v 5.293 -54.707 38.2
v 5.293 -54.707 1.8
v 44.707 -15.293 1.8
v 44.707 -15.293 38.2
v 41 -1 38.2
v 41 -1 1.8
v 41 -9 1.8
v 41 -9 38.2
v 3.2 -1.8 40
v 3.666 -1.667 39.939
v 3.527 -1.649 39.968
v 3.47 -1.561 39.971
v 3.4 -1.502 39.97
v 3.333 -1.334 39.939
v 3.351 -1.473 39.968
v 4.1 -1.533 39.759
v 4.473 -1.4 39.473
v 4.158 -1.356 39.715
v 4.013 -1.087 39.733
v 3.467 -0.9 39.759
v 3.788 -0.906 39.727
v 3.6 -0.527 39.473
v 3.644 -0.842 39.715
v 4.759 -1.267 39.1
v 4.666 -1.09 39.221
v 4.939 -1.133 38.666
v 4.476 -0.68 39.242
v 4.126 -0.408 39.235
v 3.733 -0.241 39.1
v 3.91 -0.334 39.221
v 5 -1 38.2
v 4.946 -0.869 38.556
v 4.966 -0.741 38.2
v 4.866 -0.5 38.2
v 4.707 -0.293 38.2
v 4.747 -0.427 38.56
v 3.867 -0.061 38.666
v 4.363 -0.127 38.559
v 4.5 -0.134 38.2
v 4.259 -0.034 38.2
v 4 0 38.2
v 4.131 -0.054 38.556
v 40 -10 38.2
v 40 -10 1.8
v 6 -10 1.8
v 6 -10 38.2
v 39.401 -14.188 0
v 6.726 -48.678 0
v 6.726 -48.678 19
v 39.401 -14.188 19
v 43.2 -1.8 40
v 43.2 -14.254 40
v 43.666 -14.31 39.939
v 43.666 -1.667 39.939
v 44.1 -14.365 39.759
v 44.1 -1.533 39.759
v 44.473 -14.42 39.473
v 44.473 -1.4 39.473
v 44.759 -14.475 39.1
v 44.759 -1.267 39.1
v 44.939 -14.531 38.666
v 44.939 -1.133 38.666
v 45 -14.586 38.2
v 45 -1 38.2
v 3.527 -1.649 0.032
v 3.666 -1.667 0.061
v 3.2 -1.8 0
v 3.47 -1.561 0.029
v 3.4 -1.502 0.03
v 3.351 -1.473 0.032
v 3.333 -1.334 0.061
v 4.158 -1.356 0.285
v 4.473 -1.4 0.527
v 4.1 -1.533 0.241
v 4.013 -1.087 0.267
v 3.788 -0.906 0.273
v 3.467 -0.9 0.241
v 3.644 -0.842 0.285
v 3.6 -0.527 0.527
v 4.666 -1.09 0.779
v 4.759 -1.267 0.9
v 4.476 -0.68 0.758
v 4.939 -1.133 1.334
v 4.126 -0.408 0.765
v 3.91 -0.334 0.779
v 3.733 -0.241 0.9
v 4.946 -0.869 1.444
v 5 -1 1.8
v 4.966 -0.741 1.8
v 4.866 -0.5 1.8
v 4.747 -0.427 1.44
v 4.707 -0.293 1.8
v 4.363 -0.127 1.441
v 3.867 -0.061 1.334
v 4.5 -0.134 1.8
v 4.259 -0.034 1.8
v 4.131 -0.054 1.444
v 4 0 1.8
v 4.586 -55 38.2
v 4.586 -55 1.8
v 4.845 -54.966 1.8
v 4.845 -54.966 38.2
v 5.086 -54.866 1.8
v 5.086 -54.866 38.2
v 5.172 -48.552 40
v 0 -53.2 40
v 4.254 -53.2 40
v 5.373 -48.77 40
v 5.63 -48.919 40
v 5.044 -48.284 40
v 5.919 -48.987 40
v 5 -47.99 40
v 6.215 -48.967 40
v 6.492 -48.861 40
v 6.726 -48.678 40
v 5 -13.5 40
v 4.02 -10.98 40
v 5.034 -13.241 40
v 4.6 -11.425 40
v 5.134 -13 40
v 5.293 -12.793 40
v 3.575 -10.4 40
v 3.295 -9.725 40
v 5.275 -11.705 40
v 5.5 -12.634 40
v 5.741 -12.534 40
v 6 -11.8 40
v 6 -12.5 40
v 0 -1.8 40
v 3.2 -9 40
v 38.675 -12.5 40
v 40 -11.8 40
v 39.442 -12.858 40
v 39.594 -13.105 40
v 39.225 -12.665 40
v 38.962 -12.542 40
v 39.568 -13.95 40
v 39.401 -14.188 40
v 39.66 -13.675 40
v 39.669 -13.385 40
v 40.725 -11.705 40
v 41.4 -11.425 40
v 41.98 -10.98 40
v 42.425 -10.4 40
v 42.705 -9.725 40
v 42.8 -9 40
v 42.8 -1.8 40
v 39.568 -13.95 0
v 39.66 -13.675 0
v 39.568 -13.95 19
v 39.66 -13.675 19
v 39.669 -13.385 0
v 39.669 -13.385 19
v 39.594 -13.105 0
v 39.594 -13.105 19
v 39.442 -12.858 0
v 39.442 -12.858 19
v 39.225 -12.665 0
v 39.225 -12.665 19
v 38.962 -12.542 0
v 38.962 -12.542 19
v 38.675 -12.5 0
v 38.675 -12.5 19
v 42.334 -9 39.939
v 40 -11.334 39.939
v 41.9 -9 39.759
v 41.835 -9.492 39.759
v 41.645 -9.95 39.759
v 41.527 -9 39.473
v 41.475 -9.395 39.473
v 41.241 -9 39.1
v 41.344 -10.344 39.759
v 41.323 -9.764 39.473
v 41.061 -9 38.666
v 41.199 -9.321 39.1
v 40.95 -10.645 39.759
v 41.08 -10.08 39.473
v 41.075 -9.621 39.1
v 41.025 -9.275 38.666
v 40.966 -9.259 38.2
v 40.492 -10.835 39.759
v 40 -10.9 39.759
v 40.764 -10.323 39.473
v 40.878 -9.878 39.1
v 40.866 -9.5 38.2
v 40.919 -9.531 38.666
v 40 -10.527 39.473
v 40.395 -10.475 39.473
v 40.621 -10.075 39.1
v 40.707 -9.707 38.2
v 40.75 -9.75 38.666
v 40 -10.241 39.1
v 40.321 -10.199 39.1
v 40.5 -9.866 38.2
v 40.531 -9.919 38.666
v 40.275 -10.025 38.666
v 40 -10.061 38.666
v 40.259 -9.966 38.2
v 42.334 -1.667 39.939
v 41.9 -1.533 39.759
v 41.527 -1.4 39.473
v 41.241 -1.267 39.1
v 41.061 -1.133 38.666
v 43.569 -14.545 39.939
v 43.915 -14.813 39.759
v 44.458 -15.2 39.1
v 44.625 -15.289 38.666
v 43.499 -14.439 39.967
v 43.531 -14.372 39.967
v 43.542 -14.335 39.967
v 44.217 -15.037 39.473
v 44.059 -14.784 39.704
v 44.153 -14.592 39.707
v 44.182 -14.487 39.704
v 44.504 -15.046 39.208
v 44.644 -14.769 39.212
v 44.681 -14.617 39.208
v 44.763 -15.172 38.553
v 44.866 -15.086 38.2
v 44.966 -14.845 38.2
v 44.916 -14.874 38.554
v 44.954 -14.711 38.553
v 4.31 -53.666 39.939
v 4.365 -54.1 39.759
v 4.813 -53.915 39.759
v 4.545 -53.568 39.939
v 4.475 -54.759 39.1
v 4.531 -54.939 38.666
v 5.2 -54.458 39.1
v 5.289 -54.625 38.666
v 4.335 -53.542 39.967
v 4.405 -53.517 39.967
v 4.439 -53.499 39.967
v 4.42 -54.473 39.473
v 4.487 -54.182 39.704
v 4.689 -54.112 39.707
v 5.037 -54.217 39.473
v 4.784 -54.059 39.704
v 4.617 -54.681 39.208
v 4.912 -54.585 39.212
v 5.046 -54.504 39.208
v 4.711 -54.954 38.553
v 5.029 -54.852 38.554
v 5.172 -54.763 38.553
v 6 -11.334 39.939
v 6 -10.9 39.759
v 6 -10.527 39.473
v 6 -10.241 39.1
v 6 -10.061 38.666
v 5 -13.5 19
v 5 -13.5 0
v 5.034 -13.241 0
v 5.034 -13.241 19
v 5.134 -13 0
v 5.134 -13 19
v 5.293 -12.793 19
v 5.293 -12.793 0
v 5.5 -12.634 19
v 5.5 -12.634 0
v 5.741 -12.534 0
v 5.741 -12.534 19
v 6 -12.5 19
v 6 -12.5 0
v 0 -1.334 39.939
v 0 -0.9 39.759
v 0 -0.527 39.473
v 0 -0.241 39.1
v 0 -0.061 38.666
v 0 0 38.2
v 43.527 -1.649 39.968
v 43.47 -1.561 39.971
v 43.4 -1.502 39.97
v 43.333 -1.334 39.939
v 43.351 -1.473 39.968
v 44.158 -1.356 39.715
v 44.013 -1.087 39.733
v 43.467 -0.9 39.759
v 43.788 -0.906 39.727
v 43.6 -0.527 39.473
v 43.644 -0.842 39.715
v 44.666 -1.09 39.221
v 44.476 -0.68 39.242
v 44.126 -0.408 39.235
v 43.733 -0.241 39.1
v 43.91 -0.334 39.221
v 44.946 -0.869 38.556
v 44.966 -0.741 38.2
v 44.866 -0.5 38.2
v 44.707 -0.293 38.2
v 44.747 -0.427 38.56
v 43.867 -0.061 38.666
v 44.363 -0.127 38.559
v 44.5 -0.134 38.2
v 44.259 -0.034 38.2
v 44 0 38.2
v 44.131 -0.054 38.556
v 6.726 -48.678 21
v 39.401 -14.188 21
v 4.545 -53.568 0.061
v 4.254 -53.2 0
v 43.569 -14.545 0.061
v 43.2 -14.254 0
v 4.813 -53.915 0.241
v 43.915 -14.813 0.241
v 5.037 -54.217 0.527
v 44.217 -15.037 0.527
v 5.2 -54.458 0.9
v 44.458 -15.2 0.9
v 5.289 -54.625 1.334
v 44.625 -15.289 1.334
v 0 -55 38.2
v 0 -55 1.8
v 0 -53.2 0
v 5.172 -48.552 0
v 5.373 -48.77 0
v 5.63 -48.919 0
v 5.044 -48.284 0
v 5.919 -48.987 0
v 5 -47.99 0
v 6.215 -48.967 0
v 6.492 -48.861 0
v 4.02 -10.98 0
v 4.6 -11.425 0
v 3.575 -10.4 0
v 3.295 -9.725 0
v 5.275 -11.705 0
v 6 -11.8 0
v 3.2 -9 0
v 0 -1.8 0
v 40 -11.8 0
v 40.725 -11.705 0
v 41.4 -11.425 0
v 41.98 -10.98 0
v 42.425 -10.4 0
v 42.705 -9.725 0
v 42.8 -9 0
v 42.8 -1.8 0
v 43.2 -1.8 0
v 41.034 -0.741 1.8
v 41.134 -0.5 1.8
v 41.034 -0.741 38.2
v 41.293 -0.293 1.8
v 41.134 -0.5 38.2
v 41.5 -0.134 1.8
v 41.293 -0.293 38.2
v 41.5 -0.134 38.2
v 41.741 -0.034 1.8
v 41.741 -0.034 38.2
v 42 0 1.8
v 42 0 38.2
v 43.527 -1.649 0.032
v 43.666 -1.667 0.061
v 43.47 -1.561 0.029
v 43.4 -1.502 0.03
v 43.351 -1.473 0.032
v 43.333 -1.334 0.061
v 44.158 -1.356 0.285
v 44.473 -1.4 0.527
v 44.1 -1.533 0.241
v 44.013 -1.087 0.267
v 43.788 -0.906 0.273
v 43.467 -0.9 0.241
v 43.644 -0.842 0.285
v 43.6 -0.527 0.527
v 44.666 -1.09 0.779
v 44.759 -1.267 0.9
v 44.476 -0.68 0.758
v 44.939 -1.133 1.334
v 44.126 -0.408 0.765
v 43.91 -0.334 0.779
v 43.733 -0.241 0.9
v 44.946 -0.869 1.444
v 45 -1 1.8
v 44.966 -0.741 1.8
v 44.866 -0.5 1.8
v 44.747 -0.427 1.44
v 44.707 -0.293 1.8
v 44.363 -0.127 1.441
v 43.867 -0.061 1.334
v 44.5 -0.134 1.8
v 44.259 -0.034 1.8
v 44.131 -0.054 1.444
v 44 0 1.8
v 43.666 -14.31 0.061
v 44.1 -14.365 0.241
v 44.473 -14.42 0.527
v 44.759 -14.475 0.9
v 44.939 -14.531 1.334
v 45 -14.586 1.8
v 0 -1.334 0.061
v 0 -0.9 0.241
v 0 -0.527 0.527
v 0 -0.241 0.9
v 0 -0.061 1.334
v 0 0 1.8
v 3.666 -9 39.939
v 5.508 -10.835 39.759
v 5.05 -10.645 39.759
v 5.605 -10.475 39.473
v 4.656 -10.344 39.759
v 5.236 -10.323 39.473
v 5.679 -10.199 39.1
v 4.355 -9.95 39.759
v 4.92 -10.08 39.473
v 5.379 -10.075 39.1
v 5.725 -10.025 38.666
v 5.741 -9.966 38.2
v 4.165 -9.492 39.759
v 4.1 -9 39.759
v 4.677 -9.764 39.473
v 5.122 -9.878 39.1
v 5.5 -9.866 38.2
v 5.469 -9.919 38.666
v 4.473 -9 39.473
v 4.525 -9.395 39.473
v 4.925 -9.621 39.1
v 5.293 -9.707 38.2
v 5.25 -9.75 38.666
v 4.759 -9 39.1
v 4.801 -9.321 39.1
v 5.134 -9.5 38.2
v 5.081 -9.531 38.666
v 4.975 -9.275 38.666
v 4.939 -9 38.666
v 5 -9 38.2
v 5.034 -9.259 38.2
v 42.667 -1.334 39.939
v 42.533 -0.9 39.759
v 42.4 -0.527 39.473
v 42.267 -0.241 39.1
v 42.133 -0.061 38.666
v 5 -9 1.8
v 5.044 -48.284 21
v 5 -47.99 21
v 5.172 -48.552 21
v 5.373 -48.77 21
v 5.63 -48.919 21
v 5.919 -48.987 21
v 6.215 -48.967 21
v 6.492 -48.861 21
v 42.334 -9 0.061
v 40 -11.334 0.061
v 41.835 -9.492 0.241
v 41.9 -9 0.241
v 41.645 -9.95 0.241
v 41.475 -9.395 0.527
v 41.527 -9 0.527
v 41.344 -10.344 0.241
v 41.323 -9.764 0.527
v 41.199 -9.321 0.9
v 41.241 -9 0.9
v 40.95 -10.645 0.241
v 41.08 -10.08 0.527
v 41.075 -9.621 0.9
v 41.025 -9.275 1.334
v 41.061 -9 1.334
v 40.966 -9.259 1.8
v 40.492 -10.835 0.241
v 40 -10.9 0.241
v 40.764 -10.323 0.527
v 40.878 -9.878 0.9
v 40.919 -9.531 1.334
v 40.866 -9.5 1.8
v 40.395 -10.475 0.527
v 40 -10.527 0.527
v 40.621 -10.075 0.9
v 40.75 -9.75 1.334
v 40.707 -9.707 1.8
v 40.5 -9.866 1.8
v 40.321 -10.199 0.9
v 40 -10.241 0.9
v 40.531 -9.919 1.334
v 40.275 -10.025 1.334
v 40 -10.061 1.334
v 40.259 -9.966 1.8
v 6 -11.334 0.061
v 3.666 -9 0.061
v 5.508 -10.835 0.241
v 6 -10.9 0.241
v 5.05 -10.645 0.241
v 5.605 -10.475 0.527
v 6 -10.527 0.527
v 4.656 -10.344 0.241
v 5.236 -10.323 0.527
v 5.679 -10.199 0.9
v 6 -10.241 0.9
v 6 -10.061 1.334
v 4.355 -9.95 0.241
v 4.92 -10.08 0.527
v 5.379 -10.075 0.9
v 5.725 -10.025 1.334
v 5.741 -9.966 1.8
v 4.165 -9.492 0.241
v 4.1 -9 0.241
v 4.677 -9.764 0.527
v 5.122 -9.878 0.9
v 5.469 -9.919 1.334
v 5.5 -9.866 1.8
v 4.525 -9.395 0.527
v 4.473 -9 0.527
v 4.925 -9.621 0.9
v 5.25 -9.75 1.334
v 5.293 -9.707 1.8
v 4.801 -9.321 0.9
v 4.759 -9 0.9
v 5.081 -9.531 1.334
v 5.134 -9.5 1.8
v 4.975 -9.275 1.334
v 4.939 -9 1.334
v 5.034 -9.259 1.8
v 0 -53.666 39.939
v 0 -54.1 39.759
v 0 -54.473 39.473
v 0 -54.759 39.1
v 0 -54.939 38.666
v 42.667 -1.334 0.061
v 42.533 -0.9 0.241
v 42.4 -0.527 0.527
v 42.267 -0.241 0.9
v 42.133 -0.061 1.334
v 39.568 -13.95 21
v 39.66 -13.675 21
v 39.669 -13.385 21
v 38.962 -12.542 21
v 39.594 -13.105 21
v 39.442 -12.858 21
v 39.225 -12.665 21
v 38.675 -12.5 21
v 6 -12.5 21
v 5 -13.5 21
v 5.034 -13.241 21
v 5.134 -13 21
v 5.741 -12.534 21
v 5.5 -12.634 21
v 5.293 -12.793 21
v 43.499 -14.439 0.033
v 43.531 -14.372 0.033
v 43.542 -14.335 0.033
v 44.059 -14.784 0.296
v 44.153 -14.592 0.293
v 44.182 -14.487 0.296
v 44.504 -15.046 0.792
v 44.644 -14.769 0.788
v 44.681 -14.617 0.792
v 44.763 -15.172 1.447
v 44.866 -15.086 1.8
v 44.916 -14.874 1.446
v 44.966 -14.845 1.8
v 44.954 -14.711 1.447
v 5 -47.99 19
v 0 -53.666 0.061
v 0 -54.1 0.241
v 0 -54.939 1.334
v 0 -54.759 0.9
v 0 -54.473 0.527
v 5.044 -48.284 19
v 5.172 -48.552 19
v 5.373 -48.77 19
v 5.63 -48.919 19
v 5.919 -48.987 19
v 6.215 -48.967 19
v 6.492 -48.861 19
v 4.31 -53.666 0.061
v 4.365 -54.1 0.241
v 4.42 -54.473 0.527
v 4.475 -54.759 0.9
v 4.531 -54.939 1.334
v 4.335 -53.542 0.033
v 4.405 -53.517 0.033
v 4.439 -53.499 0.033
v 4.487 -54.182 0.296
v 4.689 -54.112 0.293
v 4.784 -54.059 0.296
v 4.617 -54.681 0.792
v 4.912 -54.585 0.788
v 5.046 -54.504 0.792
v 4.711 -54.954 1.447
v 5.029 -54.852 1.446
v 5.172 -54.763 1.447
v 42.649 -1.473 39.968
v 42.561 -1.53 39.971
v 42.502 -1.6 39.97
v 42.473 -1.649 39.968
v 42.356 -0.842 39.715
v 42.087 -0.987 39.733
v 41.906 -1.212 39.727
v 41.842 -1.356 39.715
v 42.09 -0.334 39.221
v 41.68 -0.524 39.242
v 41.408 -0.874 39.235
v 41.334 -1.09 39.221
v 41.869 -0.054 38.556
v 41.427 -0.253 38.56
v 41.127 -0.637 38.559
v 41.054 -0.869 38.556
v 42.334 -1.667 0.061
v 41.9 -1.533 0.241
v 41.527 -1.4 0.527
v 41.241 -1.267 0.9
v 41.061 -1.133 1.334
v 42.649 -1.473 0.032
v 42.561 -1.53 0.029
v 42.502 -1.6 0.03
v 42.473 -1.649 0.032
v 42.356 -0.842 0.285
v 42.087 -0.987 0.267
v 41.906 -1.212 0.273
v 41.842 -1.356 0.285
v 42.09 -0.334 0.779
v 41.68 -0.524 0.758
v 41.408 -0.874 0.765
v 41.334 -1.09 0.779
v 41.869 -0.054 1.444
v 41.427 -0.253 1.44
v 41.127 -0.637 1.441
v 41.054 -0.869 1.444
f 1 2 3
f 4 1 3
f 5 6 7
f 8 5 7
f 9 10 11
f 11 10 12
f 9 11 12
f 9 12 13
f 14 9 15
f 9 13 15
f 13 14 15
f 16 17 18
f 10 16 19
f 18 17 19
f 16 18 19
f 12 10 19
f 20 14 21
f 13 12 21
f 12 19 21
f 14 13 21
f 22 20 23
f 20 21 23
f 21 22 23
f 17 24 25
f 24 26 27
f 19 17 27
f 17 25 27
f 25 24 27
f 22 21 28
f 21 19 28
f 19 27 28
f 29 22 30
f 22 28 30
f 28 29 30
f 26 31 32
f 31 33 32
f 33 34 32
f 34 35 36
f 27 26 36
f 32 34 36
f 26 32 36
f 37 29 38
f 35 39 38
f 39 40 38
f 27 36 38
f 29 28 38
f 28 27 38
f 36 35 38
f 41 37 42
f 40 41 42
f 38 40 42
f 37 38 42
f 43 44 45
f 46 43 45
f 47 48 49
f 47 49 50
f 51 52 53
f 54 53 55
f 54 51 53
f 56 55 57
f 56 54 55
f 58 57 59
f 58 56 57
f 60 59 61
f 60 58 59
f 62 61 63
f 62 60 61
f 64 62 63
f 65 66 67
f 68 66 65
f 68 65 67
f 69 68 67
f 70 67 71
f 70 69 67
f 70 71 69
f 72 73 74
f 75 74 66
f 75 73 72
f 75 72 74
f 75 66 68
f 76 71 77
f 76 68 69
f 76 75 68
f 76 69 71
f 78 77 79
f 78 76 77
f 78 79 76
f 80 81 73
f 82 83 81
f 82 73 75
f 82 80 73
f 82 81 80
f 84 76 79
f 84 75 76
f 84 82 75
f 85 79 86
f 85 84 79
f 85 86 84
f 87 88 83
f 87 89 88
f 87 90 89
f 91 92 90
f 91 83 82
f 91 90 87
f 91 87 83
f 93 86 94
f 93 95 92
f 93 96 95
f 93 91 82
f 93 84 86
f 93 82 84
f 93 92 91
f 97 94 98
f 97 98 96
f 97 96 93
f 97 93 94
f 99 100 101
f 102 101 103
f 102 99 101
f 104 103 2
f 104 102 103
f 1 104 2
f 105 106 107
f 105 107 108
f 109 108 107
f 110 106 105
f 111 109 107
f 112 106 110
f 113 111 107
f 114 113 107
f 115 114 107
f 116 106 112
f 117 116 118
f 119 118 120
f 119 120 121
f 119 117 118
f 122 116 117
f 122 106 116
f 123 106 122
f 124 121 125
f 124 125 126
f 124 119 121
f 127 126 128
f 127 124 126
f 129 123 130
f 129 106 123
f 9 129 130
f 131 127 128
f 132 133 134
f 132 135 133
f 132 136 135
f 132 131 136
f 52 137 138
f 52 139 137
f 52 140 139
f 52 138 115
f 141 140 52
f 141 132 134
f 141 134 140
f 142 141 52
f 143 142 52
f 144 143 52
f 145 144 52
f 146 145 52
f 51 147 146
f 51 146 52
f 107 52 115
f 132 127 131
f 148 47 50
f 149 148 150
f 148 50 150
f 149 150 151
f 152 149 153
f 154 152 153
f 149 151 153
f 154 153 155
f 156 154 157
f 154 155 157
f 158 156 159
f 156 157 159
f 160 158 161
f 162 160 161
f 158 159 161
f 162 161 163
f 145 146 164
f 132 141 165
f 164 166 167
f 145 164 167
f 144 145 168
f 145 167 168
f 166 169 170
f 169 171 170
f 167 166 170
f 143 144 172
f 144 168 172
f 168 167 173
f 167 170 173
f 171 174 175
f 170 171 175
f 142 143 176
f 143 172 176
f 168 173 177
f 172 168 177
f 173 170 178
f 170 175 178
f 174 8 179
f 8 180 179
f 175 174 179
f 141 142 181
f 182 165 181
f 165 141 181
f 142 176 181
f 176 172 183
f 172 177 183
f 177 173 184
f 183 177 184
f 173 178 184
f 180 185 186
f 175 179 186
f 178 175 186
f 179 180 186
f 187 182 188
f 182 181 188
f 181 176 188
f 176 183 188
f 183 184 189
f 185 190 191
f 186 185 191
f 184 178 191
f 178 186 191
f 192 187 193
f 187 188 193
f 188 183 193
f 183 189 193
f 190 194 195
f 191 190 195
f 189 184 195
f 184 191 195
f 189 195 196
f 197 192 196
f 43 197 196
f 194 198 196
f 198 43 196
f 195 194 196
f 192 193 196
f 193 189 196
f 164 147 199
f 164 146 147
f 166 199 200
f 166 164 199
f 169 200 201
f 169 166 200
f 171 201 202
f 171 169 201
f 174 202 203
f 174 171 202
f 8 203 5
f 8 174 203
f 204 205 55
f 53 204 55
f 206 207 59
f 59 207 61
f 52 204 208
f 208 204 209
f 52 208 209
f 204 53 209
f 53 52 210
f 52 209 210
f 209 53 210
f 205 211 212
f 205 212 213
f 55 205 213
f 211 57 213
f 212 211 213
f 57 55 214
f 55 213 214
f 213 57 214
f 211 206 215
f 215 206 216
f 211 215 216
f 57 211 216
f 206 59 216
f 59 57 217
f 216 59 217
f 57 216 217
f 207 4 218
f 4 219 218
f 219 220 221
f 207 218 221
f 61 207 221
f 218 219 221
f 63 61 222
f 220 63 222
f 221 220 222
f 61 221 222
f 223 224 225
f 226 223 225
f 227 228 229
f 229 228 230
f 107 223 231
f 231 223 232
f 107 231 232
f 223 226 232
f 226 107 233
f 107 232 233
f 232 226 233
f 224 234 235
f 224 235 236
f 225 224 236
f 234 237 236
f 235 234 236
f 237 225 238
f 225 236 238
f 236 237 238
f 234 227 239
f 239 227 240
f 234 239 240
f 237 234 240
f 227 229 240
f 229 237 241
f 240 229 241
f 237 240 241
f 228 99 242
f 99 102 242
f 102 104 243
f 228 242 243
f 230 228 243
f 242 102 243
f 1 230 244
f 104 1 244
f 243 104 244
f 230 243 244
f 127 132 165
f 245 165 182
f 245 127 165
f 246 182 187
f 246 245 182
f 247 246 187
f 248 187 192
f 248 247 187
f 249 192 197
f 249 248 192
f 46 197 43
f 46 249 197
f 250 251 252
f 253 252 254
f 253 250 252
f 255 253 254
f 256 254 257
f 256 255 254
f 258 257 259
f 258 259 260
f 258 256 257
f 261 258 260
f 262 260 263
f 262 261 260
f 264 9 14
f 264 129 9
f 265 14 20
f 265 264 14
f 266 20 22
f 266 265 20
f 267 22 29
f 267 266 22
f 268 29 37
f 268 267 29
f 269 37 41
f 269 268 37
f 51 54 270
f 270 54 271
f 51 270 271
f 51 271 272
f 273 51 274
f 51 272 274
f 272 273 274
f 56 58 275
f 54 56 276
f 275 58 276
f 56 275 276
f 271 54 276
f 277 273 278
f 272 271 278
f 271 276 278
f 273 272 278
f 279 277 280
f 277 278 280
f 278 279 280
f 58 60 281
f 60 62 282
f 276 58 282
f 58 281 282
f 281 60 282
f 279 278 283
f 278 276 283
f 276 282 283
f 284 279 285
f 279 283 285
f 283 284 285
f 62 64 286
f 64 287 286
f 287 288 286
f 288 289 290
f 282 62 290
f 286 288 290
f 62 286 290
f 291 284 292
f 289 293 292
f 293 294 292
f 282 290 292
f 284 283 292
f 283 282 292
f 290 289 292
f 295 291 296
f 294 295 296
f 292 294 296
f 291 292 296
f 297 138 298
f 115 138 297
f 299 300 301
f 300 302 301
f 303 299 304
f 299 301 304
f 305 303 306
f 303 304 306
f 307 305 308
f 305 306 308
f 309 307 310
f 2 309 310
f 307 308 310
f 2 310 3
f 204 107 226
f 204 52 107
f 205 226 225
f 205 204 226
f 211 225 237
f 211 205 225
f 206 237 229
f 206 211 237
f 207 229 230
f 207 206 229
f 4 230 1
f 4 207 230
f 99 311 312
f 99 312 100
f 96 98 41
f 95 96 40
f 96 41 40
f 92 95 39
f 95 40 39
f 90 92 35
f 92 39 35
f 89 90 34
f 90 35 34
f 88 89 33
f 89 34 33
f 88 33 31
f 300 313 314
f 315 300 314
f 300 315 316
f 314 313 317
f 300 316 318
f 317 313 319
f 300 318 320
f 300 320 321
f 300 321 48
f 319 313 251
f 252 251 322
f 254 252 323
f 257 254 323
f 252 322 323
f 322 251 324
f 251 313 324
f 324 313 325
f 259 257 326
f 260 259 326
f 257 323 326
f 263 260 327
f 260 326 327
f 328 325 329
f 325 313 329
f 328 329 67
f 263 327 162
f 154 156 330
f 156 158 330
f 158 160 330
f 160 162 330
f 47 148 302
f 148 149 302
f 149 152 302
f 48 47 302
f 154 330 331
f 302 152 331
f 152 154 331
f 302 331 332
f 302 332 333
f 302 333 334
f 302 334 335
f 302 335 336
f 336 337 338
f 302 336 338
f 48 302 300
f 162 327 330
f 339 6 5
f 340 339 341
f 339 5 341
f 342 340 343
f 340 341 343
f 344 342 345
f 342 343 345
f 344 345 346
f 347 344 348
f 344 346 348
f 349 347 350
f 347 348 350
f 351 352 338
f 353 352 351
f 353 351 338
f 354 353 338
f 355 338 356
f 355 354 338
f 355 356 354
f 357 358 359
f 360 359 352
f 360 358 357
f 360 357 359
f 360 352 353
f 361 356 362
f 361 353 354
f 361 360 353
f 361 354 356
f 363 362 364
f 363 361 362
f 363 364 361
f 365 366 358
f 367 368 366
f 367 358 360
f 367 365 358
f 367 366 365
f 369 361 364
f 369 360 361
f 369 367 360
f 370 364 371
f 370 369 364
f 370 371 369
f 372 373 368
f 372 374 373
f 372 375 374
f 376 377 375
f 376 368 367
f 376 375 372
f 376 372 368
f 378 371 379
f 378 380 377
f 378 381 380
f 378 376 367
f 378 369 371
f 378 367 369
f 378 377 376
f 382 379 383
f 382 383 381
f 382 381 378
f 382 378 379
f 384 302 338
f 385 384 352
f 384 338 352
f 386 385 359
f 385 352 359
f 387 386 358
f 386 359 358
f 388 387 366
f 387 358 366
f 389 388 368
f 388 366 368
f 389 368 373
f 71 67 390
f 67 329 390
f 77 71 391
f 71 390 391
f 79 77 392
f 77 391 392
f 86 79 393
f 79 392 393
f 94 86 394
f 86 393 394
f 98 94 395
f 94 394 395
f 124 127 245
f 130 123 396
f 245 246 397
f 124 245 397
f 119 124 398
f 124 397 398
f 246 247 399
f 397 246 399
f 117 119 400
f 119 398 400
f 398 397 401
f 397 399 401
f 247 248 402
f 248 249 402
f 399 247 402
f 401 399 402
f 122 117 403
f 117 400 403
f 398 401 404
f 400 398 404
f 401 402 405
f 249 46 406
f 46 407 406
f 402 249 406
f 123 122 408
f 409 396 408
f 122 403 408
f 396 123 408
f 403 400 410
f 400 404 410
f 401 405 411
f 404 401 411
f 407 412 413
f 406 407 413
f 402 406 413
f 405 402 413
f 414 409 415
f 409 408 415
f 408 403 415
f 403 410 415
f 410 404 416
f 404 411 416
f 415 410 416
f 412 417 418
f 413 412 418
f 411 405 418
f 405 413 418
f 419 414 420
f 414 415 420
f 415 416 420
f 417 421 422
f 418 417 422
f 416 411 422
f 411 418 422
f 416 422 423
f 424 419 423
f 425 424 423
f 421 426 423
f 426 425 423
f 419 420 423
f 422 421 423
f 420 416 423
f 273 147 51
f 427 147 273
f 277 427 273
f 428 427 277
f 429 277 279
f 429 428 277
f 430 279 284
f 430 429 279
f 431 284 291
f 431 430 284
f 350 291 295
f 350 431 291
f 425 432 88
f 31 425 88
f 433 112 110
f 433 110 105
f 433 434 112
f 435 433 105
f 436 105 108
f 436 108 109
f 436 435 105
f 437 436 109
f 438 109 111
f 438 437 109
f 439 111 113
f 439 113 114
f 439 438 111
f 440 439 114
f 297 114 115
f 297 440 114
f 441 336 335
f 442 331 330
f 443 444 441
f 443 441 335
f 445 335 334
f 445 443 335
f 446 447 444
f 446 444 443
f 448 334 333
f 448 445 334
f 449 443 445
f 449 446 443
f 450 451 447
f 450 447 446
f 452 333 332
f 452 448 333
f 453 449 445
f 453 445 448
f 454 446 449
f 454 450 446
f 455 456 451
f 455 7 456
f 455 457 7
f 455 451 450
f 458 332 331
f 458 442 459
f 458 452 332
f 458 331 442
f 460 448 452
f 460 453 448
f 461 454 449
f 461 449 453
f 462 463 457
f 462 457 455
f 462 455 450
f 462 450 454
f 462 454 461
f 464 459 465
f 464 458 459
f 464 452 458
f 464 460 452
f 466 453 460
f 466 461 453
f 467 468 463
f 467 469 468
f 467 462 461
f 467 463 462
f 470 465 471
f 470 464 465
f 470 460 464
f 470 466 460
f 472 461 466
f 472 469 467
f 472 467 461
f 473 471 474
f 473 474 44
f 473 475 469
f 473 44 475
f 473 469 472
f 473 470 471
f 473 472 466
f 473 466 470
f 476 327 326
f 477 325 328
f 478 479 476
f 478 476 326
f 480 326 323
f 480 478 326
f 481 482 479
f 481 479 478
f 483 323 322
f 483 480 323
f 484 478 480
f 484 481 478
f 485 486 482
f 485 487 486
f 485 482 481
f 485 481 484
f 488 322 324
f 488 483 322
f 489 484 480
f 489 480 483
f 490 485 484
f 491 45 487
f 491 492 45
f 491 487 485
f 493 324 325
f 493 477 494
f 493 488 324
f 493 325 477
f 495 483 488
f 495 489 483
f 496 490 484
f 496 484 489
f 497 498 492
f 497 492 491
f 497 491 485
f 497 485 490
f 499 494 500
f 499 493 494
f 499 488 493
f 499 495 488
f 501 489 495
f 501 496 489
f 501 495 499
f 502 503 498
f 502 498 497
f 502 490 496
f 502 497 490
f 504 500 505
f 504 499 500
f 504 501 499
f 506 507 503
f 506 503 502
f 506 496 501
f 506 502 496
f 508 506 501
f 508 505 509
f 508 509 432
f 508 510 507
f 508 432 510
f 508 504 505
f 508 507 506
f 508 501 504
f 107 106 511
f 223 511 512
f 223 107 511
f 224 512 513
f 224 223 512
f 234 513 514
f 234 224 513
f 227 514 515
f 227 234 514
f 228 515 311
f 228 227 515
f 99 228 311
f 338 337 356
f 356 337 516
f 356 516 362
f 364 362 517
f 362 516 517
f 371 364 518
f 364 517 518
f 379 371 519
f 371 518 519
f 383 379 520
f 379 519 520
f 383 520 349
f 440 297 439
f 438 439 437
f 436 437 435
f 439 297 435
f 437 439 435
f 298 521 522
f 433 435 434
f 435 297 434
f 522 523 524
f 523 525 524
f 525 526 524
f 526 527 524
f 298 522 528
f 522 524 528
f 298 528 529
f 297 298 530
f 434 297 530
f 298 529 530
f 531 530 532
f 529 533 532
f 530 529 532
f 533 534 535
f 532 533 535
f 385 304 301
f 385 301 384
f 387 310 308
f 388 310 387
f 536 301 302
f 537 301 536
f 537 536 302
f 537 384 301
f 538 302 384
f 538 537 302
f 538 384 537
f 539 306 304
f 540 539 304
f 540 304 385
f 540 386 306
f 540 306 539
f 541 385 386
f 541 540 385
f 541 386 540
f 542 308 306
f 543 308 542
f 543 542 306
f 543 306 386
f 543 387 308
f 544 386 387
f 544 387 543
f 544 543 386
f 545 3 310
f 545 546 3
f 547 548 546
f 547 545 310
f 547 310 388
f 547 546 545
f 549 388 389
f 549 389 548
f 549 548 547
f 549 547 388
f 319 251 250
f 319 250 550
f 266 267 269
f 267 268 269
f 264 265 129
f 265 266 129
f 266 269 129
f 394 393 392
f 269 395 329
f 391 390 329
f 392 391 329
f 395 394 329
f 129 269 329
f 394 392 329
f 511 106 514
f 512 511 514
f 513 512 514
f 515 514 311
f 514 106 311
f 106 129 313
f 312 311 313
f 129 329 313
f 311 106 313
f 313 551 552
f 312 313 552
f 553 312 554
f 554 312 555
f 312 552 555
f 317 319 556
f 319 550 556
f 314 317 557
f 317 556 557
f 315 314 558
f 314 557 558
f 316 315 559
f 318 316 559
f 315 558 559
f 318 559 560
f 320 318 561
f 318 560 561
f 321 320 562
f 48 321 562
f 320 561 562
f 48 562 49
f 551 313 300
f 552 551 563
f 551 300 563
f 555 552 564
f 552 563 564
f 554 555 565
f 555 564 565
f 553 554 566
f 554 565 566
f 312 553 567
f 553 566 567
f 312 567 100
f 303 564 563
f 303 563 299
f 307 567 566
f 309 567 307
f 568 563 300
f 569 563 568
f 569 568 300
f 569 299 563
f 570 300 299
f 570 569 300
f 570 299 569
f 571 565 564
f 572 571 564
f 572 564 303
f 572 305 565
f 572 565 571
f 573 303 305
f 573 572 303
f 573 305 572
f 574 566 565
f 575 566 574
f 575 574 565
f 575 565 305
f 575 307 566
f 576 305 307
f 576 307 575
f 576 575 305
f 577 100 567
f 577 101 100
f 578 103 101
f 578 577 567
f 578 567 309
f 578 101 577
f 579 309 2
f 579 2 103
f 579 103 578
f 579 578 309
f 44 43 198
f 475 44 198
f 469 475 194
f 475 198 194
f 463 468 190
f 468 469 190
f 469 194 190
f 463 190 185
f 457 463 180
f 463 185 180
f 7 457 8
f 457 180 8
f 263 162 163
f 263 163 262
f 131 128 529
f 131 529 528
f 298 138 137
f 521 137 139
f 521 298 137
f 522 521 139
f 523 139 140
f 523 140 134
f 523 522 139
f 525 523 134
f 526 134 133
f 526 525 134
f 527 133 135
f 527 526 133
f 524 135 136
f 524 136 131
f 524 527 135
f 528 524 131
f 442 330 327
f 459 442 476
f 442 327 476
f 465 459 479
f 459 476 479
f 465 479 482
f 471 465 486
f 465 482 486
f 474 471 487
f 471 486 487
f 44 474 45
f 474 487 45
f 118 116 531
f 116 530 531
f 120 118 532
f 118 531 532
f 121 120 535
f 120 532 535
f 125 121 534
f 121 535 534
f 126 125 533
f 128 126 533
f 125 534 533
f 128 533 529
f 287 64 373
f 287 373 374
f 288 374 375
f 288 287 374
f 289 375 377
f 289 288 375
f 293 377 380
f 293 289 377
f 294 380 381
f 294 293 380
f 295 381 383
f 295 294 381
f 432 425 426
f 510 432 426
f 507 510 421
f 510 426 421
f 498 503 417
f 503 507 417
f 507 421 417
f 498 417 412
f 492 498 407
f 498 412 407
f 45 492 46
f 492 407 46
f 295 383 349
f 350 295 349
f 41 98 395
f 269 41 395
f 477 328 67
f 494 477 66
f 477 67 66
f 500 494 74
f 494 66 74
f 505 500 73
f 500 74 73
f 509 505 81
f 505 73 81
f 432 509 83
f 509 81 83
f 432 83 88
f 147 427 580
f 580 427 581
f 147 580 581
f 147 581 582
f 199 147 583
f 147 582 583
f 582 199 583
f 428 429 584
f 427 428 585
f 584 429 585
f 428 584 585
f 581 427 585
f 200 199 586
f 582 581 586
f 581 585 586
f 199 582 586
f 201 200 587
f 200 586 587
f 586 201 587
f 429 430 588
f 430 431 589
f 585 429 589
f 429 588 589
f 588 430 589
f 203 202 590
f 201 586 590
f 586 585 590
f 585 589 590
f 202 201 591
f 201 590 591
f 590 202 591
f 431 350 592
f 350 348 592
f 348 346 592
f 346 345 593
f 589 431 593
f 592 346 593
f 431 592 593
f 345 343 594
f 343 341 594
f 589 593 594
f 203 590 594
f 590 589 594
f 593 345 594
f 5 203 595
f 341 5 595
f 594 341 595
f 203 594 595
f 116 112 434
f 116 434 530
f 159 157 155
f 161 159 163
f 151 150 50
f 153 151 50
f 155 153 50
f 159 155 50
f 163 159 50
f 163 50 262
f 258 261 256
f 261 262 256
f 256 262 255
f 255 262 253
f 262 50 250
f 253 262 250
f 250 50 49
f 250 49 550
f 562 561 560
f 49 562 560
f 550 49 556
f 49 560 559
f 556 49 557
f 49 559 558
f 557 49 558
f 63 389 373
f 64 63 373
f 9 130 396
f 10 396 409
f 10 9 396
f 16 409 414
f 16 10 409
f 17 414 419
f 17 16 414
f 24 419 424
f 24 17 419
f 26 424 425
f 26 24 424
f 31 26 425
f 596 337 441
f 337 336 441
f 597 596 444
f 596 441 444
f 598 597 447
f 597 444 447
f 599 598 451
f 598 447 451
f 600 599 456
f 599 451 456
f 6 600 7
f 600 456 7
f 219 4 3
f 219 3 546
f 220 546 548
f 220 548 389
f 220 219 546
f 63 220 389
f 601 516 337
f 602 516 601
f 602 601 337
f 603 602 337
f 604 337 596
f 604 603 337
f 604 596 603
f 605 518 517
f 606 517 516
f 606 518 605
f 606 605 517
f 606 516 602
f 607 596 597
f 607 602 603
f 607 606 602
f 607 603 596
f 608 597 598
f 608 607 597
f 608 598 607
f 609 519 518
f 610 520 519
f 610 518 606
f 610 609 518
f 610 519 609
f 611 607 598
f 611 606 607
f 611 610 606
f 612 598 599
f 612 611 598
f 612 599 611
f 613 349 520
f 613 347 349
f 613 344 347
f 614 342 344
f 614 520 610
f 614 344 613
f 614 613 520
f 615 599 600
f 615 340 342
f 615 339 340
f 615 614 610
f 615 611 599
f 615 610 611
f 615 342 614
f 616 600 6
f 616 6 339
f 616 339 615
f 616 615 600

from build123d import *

# Parameters (mm, degrees)
PAD_DEPTH       = 40
POCKET_DEPTH    = 19
POCKET001_DEPTH = 19
FILLET_R        = 1
FILLET001_R     = 1.8


with BuildPart() as part:
    # Sketch → Pad (new body)
    with BuildSketch(Plane.XY):
        Polygon((0, 0), (0, -55), (5, -55), (45, -15), (45, 0), (41, 0), (41, -10), (5, -10), (5, 0), align=None)
    extrude(amount=PAD_DEPTH)

    # Sketch001 (on Face10 of Pad) → Pocket (cut)
    with BuildSketch(Plane(origin=(0, 0, 0), x_dir=(1, 0, 0), z_dir=(0, 0, -1))):
        Polygon((5, 12.5), (5, 50.5), (41, 12.5), align=None)
    extrude(amount=-POCKET_DEPTH, mode=Mode.SUBTRACT)

    # Sketch002 (on Face5 of Pocket) → Pocket001 (cut)
    with BuildSketch(Plane.XY.offset(40)):
        Polygon((5, -12.5), (41, -12.5), (5, -50.5), align=None)
    extrude(amount=-POCKET001_DEPTH, mode=Mode.SUBTRACT)

    # Fillet
    fillet_edges = [part.edges().sort_by_distance(p)[0] for p in [
        (5, 0, 20),
        (5, -10, 20),
        (45, -15, 20),
        (45, 0, 20),
        (41, 0, 20),
        (5, -55, 20),
        (41, -10, 20),
        (41, -12.5, 30.5),
        (5, -12.5, 30.5),
        (5, -50.5, 30.5),
        (5, -12.5, 9.5),
        (5, -50.5, 9.5),
        (41, -12.5, 9.5),
    ]]
    fillet(fillet_edges, radius=FILLET_R)

    # Fillet001
    fillet001_edges = [part.edges().sort_by_distance(p)[0] for p in [
        (23, -10, 40),
        (23, -10, 0),
    ]]
    fillet(fillet001_edges, radius=FILLET001_R)


solid = part.part
